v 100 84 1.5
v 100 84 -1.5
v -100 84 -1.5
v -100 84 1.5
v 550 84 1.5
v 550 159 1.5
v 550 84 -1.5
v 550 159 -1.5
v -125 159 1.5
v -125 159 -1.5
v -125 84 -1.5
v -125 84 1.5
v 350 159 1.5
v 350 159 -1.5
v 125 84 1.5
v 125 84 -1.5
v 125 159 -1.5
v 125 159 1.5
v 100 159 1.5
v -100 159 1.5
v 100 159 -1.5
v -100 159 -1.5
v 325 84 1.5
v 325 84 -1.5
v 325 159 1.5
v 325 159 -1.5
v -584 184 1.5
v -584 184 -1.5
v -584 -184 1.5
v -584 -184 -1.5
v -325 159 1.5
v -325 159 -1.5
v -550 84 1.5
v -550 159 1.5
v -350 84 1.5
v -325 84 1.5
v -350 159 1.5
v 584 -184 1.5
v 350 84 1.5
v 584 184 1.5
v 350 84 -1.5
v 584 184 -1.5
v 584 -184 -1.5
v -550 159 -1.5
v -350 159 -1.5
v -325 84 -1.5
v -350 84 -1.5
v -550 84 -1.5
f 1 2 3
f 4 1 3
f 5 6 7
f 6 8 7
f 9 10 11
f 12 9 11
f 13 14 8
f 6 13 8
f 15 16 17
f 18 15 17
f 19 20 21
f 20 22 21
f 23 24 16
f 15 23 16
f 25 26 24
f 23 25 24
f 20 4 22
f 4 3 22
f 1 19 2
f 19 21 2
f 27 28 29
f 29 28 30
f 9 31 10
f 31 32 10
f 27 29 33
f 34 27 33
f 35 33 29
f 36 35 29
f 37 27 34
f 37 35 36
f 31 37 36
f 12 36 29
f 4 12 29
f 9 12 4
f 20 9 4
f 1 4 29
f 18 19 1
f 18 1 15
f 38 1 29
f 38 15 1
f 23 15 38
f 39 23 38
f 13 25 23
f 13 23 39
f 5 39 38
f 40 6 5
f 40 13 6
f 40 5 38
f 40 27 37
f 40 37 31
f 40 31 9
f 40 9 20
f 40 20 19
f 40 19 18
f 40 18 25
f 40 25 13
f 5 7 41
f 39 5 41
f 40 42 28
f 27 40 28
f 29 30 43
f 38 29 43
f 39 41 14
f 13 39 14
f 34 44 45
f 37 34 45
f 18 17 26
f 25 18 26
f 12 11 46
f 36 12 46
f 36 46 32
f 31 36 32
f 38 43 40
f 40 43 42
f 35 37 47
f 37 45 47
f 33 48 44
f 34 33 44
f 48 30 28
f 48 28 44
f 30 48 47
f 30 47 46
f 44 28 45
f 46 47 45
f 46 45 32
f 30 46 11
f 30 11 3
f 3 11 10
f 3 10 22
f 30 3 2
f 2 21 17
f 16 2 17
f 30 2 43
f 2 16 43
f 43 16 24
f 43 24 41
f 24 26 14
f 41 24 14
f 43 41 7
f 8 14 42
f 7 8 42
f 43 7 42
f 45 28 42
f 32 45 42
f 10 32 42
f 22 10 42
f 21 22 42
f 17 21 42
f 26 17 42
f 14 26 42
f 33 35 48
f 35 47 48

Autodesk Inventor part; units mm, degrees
ref_plane "YZ Plane" through (0, 0, 0) normal (1, 0, 0) x (0, 1, 0)
ref_plane "XZ Plane" through (0, 0, 0) normal (0, 1, 0) x (-1, 0, 0)
ref_plane "XY Plane" through (0, 0, 0) normal (0, 0, 1) x (1, 0, 0)
sketch "Sketch1" plane through (0, 0, 0) normal (0, 0, 1) x (1, 0, 0)
  line L0 (-584, -184) -> (584, -184)
  line L1 (584, -184) -> (584, 184)
  line L2 (584, 184) -> (-584, 184)
  line L3 (-584, 184) -> (-584, -184)
  line L4 (-584, -184) -> (584, 184) construction
  line L5 (584, -184) -> (-584, 184) construction
  line L6 (-550, 159) -> (-350, 159)
  line L7 (-350, 159) -> (-350, 84)
  line L8 (-350, 84) -> (-550, 84)
  line L9 (-550, 84) -> (-550, 159)
  line L10 (-325, 84) -> (-325, 159)
  line L11 (-325, 159) -> (-125, 159)
  line L12 (-125, 159) -> (-125, 84)
  line L13 (-125, 84) -> (-325, 84)
  line L14 (-100, 84) -> (-100, 159)
  line L15 (-100, 159) -> (100, 159)
  line L16 (100, 159) -> (100, 84)
  line L17 (100, 84) -> (-100, 84)
  line L18 (125, 84) -> (125, 159)
  line L19 (125, 159) -> (325, 159)
  line L20 (325, 159) -> (325, 84)
  line L21 (325, 84) -> (125, 84)
  line L22 (350, 84) -> (350, 159)
  line L23 (350, 159) -> (550, 159)
  line L24 (550, 159) -> (550, 84)
  line L25 (550, 84) -> (350, 84)
  point P0 (0, 0)
  point P1 (-550, 121.5)
  point P2 (-325, 121.5)
  point P3 (-100, 121.5)
  point P4 (125, 121.5)
  point P5 (350, 121.5)
  dimension "d0" = 1168
  dimension "d1" = 368
  dimension "d2" = 75
  dimension "d3" = 25
  dimension "d4" = 200
  dimension "d5" = 34
  dimension "d10" = 225
extrude "Extrusion2" add sketch "Sketch1" along normal mid plane 3
properties part number "Lado" material "Acrylic"
